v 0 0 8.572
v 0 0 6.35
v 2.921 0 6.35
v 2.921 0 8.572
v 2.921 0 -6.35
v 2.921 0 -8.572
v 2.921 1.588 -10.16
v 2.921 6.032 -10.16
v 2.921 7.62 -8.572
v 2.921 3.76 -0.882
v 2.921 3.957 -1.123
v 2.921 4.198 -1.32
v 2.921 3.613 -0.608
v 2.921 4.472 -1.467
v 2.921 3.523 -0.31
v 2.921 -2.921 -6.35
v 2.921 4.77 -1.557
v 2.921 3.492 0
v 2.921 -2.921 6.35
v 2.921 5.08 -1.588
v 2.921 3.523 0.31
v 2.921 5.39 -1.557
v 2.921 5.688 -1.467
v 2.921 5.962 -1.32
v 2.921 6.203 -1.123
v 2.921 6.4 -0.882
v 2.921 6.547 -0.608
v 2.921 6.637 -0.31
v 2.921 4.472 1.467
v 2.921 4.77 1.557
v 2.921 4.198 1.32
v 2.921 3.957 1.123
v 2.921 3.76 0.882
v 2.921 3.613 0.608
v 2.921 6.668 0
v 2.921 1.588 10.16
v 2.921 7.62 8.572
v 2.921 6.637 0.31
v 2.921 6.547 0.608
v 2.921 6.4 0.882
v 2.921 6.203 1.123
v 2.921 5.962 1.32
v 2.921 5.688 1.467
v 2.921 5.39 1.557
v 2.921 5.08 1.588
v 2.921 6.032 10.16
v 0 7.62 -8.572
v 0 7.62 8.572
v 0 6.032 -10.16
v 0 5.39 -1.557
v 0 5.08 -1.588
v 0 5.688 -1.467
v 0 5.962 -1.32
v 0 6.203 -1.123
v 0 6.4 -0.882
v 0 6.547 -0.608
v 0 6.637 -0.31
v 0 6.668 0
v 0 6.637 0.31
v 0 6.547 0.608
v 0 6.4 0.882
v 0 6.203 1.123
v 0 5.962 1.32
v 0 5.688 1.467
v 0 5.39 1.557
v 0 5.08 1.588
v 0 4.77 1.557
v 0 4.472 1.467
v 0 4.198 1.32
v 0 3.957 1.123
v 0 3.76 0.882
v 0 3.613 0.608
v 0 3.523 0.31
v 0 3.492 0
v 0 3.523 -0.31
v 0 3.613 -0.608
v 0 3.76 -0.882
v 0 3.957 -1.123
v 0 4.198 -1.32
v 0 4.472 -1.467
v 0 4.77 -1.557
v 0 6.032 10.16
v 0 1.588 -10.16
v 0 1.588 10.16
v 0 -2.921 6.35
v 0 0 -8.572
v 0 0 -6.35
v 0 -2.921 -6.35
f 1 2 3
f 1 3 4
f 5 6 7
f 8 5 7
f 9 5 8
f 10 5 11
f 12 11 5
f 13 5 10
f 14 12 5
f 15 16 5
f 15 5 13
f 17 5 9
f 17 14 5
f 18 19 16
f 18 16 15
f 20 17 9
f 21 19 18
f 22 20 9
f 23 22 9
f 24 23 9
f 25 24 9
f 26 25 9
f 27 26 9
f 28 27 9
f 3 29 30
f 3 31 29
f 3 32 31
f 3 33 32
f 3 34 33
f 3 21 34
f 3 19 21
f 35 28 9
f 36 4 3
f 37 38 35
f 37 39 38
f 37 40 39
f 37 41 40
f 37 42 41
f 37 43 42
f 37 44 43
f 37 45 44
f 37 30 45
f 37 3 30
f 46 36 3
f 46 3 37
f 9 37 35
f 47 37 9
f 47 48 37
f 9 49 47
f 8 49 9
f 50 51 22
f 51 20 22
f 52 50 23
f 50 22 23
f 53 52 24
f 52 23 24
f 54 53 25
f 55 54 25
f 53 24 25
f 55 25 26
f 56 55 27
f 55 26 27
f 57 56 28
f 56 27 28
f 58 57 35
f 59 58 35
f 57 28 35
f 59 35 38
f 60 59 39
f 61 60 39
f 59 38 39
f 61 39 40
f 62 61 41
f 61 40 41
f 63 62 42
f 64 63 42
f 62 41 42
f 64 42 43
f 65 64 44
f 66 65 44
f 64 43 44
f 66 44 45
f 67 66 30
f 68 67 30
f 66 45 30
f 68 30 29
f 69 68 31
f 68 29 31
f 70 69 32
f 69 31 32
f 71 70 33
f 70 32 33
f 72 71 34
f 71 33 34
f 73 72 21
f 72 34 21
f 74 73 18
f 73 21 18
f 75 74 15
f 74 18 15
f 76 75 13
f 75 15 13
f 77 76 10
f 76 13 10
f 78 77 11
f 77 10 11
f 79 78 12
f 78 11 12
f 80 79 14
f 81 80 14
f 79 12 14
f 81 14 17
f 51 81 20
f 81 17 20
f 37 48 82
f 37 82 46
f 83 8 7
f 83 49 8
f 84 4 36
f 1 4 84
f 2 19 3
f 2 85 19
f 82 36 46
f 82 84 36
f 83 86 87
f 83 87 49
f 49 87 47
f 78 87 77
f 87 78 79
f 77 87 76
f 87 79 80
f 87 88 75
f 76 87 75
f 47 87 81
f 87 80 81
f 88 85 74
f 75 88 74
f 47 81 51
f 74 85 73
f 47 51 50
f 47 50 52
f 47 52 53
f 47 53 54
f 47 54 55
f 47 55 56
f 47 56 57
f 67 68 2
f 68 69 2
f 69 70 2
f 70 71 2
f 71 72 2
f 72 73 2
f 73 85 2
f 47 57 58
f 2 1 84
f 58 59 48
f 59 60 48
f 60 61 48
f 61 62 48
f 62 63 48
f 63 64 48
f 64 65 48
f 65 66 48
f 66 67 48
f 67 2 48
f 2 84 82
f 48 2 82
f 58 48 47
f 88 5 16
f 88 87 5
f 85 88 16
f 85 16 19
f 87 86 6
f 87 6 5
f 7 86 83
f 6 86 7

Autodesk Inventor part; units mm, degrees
ref_plane "YZ Plane" through (0, 0, 0) normal (1, 0, 0) x (0, 1, 0)
ref_plane "XZ Plane" through (0, 0, 0) normal (0, 1, 0) x (-1, 0, 0)
ref_plane "XY Plane" through (0, 0, 0) normal (0, 0, 1) x (1, 0, 0)
sketch "Sketch1" plane through (0, 0, 0) normal (1, 0, 0) x (0, 1, 0)
  line L0 (0, 10.16) -> (7.62, 10.16)
  line L1 (7.62, 10.16) -> (7.62, -10.16)
  line L2 (7.62, -10.16) -> (0, -10.16)
  line L3 (0, -10.16) -> (0, -6.35)
  line L4 (0, -6.35) -> (-2.921, -6.35)
  line L5 (-2.921, -6.35) -> (-2.921, 6.35)
  line L6 (-2.921, 6.35) -> (0, 6.35)
  line L7 (0, 6.35) -> (0, 10.16)
  point P0 (0, 0)
  dimension "d0" = 12.7
  dimension "d1" = 2.921
  dimension "d2" = 20.32
  dimension "d3" = 10.16
  dimension "d4" = 3.81
  dimension "d5" = 7.62
extrude "Extrusion1" add sketch "Sketch1" along normal blind 2.921
sketch "Sketch2" plane through (2.921, 0, 0) normal (1, 0, 0) x (0, 0, -1)
  circle A0 centre (0, 5.08) radius 1.5875
  point P0 (0, 0)
  dimension "d8" = 3.175
  dimension "d9" = 5.08
extrude "Extrusion2" cut sketch "Sketch2" against normal blind 2.921
chamfer "Chamfer1" distance 1.5875 angle 45 4 edges at (1.4605, 7.62, 10.16) (1.4605, 0, 10.16) (1.4605, 7.62, -10.16) (1.4605, 0, -10.16)
properties part number "batterywall"
